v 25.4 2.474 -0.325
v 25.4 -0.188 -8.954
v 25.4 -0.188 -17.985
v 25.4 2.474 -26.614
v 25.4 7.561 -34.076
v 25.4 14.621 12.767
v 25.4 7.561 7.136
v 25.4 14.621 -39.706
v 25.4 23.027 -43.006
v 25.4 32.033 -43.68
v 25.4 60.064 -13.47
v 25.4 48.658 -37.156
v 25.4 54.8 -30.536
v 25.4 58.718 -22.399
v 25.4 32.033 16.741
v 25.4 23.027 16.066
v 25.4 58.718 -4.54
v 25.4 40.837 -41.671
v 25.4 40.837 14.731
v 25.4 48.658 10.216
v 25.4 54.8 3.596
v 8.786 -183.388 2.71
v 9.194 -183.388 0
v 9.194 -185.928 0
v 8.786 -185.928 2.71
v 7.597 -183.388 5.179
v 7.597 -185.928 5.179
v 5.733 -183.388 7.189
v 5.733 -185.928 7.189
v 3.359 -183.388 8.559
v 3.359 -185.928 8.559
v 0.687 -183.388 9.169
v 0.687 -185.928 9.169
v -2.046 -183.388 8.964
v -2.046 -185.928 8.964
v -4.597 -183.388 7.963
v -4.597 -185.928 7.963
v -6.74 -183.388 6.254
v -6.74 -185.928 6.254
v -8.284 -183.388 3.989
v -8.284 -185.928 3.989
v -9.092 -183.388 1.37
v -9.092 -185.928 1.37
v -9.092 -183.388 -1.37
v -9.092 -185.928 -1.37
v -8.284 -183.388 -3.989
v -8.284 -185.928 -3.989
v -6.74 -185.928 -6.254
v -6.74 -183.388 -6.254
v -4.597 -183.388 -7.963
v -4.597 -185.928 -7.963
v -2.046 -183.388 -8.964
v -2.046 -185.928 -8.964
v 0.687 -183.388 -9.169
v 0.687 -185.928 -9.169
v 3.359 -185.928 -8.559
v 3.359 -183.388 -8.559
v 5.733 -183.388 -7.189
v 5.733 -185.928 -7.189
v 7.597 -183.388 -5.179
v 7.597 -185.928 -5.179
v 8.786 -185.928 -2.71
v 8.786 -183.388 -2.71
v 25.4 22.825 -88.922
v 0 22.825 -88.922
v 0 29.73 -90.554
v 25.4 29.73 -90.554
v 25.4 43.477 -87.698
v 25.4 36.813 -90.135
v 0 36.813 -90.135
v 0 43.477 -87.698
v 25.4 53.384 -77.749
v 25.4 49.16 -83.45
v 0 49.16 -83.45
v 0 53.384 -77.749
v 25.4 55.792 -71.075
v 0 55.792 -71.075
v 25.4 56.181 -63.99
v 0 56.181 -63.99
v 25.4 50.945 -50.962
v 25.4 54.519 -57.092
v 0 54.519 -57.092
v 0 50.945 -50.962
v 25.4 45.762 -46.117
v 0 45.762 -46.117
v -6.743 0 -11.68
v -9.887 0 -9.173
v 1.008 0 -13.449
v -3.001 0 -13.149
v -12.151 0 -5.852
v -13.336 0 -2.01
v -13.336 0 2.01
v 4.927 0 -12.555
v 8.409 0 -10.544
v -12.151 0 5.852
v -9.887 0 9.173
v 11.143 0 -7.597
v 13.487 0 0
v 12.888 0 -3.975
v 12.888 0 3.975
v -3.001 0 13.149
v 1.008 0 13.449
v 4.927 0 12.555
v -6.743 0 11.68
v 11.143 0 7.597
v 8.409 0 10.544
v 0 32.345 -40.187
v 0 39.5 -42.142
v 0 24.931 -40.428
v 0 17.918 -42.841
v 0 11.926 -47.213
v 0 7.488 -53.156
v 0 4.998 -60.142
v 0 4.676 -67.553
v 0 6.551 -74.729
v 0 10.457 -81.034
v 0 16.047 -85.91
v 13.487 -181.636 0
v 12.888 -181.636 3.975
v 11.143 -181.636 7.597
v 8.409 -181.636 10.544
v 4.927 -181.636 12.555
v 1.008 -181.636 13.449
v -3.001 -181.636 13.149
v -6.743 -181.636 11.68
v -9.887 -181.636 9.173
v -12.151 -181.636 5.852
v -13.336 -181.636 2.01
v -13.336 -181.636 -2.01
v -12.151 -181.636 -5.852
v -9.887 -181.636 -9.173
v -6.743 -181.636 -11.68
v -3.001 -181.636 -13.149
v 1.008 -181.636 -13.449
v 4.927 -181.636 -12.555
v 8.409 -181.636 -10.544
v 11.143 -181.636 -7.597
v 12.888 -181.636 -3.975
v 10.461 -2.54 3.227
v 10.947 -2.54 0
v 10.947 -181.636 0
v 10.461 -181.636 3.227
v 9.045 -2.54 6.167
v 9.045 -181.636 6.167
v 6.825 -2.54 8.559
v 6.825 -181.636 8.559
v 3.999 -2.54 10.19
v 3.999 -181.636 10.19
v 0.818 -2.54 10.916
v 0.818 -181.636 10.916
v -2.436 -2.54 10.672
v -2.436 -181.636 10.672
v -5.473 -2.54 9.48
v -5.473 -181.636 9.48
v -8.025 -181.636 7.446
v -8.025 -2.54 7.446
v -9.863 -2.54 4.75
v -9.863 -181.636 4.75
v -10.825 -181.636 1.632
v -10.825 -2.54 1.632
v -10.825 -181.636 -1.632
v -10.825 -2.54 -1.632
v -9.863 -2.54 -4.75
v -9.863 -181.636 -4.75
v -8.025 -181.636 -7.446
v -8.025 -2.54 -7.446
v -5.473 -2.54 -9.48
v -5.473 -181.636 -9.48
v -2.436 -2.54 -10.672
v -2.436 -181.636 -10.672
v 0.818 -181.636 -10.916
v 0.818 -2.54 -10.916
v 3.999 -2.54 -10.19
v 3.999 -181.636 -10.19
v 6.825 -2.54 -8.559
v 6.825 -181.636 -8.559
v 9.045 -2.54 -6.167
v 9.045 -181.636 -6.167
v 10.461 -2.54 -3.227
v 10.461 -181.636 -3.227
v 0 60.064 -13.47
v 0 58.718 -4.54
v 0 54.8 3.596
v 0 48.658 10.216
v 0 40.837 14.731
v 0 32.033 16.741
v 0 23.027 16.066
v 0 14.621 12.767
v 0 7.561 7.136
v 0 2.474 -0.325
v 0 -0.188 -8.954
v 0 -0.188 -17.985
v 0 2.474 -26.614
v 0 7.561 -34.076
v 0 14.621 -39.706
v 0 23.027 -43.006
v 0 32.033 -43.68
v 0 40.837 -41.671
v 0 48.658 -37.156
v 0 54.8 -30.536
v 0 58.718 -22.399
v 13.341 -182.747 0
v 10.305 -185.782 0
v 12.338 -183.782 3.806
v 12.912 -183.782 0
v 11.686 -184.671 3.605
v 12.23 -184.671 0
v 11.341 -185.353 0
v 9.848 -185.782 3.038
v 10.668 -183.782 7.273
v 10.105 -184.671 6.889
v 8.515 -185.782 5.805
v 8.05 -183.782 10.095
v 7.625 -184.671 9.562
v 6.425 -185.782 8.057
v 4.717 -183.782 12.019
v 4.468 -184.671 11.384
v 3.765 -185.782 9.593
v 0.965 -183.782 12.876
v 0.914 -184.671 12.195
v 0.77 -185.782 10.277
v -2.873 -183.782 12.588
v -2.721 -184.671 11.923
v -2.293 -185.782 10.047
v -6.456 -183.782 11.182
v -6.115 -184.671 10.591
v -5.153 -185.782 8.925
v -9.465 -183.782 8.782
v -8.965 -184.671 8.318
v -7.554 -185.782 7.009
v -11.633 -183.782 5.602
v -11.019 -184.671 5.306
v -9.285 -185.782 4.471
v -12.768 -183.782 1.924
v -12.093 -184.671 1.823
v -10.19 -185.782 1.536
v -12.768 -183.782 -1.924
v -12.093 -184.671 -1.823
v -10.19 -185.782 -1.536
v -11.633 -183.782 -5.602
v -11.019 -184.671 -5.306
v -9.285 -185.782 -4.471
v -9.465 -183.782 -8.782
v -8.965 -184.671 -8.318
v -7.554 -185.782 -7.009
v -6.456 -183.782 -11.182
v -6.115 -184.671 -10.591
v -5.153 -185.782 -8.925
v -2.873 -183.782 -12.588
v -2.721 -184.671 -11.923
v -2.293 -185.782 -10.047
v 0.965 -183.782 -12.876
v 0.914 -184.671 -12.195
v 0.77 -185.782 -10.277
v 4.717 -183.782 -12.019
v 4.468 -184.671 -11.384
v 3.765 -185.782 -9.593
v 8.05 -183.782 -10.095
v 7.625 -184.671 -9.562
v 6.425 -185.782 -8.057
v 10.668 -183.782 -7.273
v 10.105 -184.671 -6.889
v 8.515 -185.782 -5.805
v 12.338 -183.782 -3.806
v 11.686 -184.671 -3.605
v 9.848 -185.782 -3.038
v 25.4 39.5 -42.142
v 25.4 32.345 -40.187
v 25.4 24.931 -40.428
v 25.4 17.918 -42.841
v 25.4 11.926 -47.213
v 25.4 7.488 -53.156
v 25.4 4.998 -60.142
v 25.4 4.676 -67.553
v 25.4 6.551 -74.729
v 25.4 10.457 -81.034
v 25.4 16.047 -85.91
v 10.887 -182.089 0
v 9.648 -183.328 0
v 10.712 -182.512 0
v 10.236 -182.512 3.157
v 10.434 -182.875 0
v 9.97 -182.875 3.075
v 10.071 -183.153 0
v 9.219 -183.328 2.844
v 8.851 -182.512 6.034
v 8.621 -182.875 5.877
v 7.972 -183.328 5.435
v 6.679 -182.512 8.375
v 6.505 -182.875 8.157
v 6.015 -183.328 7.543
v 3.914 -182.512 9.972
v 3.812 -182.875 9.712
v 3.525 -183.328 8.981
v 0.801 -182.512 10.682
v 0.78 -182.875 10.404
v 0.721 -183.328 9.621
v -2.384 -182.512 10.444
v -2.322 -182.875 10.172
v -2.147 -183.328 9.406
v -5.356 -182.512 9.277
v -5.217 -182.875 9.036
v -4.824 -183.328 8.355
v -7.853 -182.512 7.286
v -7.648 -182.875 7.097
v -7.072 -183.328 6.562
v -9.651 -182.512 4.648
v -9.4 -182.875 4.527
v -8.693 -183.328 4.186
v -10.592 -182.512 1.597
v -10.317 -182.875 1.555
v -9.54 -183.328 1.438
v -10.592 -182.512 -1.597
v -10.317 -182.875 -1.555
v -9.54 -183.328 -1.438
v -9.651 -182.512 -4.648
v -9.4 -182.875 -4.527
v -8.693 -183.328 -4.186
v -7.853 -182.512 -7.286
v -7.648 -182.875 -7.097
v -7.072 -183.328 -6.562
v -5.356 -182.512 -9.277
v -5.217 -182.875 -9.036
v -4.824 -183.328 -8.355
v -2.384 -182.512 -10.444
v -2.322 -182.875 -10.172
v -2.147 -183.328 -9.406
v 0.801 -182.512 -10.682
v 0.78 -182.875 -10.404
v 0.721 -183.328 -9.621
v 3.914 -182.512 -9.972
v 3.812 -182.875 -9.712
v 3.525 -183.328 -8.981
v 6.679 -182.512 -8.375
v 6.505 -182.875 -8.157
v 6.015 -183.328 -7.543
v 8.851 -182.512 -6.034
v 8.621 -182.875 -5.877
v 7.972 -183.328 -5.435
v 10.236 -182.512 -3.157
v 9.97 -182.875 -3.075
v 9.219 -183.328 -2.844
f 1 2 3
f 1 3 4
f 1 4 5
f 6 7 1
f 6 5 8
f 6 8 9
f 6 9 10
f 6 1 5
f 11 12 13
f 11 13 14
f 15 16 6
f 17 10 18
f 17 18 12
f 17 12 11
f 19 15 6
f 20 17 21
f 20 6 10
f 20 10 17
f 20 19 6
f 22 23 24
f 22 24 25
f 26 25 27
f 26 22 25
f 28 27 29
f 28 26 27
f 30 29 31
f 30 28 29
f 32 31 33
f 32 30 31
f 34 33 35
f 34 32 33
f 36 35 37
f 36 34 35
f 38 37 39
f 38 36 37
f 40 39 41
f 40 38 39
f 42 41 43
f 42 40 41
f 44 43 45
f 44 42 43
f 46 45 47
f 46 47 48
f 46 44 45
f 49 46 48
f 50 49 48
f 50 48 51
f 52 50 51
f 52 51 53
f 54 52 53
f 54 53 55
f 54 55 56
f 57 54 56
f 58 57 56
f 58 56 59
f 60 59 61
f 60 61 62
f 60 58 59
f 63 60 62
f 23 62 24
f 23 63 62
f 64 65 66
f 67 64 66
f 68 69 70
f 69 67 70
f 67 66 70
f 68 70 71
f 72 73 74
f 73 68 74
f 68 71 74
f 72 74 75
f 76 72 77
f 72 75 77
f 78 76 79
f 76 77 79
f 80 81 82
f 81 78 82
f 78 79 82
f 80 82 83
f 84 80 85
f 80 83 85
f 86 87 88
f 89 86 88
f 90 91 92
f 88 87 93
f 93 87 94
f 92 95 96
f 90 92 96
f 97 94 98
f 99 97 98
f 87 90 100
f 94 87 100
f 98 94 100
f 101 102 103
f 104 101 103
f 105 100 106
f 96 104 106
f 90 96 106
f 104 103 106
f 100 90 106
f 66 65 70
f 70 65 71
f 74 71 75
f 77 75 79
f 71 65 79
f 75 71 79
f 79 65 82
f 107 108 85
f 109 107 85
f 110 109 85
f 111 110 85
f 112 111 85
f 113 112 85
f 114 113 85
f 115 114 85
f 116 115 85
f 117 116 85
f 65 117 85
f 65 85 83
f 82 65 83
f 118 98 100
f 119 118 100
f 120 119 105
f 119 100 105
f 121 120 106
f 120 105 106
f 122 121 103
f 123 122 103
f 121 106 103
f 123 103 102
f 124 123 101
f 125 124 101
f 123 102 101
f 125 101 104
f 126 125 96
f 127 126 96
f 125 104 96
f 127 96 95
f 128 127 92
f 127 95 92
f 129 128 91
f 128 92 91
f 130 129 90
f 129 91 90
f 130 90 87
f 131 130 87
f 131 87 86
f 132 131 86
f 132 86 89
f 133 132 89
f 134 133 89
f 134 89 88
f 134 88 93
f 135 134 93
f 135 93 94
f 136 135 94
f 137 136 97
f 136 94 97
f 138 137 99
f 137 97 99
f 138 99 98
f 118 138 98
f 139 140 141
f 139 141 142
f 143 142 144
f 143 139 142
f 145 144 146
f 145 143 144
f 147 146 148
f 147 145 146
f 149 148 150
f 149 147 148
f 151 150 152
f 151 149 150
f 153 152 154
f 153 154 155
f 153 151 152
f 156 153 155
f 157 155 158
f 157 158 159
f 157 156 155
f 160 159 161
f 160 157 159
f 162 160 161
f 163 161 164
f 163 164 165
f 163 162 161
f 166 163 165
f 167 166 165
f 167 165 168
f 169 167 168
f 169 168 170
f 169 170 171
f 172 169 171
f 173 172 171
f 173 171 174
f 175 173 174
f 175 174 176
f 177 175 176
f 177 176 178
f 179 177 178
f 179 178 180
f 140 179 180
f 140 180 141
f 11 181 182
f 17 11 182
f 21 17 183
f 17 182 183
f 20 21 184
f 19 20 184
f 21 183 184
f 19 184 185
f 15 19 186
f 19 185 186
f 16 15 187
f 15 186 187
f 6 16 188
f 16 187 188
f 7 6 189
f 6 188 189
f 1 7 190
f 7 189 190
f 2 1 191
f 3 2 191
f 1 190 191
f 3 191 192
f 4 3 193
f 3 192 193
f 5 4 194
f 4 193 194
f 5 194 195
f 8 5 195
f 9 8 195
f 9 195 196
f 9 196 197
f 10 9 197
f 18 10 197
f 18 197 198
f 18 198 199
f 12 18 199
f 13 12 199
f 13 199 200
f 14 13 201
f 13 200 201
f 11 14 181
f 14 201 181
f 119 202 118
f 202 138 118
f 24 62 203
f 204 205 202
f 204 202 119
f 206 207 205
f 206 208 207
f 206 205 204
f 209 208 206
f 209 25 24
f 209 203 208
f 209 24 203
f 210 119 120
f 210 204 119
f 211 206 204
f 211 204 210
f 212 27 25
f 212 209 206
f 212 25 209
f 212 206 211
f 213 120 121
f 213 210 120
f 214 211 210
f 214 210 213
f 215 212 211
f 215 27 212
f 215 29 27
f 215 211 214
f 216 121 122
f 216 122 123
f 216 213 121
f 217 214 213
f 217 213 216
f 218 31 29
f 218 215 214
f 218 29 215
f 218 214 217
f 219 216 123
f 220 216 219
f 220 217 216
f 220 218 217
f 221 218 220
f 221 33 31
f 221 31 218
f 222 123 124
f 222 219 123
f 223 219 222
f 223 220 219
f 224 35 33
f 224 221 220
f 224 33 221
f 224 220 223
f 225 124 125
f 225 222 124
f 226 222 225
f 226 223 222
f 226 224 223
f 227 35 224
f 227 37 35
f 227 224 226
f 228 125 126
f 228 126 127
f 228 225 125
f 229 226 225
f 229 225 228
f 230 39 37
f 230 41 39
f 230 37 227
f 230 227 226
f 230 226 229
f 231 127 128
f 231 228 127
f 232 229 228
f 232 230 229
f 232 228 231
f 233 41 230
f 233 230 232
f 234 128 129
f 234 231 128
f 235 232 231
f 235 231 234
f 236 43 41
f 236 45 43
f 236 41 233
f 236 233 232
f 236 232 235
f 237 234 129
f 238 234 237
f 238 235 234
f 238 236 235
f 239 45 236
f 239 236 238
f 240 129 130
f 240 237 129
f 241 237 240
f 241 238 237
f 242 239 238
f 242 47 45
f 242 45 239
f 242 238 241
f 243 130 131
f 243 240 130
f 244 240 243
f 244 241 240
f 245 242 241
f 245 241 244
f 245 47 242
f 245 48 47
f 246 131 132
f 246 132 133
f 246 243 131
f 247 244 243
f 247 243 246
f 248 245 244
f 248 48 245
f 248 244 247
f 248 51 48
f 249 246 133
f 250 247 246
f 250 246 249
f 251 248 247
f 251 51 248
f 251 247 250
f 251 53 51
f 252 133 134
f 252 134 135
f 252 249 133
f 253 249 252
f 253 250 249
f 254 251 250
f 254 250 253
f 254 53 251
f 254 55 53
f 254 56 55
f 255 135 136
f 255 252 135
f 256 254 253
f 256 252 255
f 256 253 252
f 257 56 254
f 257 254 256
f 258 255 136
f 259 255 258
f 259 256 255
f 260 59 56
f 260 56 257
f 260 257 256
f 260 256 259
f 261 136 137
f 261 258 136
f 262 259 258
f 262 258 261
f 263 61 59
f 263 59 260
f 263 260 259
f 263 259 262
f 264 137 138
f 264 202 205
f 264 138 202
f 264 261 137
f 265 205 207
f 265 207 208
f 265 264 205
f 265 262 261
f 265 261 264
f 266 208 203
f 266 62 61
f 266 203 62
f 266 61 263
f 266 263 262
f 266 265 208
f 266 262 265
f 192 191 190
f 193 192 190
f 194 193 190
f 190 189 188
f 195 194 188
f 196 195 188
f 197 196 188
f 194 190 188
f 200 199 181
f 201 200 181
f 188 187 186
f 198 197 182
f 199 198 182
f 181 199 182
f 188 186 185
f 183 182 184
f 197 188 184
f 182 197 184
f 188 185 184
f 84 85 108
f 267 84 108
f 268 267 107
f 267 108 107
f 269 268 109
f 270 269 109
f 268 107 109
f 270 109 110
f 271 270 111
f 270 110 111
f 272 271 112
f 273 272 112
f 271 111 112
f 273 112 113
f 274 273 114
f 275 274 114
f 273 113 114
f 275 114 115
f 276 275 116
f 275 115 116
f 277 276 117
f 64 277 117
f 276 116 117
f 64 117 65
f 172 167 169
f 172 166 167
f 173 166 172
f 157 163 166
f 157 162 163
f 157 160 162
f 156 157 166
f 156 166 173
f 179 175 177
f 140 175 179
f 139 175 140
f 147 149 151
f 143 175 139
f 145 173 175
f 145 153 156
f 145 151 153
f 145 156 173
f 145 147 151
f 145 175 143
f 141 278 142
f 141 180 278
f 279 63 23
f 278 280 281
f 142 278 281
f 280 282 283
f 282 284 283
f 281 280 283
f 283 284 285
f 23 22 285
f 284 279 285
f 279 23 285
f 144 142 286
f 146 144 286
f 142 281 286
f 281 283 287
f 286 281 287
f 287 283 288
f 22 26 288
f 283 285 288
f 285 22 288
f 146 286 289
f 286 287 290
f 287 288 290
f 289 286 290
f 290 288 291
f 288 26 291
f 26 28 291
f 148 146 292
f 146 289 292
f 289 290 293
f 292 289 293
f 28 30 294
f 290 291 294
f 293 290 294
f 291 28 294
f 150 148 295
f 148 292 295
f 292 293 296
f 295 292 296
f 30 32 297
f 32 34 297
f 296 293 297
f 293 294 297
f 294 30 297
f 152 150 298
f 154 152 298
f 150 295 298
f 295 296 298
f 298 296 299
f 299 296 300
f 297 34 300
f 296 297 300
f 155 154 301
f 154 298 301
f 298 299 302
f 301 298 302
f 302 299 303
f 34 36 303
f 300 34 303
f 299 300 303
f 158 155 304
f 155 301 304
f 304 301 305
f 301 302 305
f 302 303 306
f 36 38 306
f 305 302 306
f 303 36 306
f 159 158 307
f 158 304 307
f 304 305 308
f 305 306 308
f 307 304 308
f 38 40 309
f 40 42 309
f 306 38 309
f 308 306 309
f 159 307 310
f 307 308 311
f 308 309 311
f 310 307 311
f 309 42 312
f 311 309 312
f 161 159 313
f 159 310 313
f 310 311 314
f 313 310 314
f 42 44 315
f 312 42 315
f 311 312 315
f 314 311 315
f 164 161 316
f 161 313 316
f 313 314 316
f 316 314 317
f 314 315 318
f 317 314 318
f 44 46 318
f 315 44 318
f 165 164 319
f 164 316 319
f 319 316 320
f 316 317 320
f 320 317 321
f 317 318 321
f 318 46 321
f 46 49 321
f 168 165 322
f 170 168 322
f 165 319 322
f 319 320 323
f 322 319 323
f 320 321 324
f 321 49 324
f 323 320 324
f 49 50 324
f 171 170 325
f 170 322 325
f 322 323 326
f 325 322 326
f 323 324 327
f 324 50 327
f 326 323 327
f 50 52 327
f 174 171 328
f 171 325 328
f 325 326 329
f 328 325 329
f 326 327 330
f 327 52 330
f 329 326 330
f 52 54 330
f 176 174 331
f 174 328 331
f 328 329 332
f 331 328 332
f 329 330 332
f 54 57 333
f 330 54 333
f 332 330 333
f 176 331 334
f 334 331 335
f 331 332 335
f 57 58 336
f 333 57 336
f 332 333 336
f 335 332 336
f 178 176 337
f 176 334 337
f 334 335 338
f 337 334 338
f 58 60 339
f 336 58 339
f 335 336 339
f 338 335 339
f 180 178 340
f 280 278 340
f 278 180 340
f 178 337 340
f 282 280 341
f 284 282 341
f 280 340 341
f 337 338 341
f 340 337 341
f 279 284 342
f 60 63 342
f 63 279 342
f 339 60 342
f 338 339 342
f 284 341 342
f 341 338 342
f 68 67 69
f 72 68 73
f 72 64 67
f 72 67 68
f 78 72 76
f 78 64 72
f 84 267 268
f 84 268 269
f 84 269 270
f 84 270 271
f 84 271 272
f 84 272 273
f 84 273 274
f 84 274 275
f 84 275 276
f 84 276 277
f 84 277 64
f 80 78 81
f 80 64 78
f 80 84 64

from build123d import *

# Parameters (mm, degrees)
F0_R      = 13.4869119151
F1_DEPTH  = 185.928
F2_R      = 4.2924717139
F3_T      = -2.54
F4_R      = 24.8992678704
F5_DEPTH  = 25.4
F6_R      = 24.4404976371
F5_FACE_R = 24.8992678704
F7_DEPTH  = 25.4
F8_R      = 30.2953984927
F9_DEPTH  = 25.4


# Not quite as in the source:
# - a shell that OpenCascade refuses in one call is made with other operations: the cavity is built on its own and cut out


with BuildPart() as f1:
    # F0 (on Front) → F1 (new body)
    with BuildSketch(Plane.XZ):
        Circle(F0_R)
    extrude(amount=F1_DEPTH)

    # F2
    f2_edges = [f1.edges().sort_by_distance(p)[0] for p in [
        (-13.486912, -185.928, 0),
    ]]
    fillet(f2_edges, radius=F2_R)

    # F3: a shell. OpenCascade refuses it in one call, so the cavity is built on its own and cut out:
    # the body offset inwards by the wall thickness, plus a prism from it out through each open face.
    f3_core = offset(f1.part, amount=F3_T, mode=Mode.PRIVATE)
    f3_exits = [f3_core.faces().sort_by_distance(p)[0] for p in [
        (0, -183.388, 0),
    ]]
    add(f3_core, mode=Mode.SUBTRACT)
    extrude(f3_exits, amount=-F3_T, mode=Mode.SUBTRACT)


with BuildPart() as f5:
    # F4 (on Right) → F5 (new body)
    with BuildSketch(Plane.YZ):
        with Locations((29.4352918863, -64.9161785841)):
            Circle(F4_R)
    extrude(amount=F5_DEPTH)

    # F6 (on Right) + F5_face (on face) → F7 (join)
    with BuildSketch(Plane.YZ):
        with Locations((31.84100613, -66.205278039)):
            Circle(F6_R)
    with BuildSketch(Plane(origin=(0, 29.4352918863, -64.9161785841), x_dir=(0, 1, 0), z_dir=(-1, 0, 0))):
        Circle(F5_FACE_R)
    extrude(amount=F7_DEPTH, dir=(1, 0, 0))


with BuildPart() as f9:
    # F8 (on Right) → F9 (new body)
    with BuildSketch(Plane.YZ):
        with Locations((29.7687537968, -13.4697174653)):
            Circle(F8_R)
    extrude(amount=F9_DEPTH)


solid = Compound([f1.part, f5.part, f9.part])
